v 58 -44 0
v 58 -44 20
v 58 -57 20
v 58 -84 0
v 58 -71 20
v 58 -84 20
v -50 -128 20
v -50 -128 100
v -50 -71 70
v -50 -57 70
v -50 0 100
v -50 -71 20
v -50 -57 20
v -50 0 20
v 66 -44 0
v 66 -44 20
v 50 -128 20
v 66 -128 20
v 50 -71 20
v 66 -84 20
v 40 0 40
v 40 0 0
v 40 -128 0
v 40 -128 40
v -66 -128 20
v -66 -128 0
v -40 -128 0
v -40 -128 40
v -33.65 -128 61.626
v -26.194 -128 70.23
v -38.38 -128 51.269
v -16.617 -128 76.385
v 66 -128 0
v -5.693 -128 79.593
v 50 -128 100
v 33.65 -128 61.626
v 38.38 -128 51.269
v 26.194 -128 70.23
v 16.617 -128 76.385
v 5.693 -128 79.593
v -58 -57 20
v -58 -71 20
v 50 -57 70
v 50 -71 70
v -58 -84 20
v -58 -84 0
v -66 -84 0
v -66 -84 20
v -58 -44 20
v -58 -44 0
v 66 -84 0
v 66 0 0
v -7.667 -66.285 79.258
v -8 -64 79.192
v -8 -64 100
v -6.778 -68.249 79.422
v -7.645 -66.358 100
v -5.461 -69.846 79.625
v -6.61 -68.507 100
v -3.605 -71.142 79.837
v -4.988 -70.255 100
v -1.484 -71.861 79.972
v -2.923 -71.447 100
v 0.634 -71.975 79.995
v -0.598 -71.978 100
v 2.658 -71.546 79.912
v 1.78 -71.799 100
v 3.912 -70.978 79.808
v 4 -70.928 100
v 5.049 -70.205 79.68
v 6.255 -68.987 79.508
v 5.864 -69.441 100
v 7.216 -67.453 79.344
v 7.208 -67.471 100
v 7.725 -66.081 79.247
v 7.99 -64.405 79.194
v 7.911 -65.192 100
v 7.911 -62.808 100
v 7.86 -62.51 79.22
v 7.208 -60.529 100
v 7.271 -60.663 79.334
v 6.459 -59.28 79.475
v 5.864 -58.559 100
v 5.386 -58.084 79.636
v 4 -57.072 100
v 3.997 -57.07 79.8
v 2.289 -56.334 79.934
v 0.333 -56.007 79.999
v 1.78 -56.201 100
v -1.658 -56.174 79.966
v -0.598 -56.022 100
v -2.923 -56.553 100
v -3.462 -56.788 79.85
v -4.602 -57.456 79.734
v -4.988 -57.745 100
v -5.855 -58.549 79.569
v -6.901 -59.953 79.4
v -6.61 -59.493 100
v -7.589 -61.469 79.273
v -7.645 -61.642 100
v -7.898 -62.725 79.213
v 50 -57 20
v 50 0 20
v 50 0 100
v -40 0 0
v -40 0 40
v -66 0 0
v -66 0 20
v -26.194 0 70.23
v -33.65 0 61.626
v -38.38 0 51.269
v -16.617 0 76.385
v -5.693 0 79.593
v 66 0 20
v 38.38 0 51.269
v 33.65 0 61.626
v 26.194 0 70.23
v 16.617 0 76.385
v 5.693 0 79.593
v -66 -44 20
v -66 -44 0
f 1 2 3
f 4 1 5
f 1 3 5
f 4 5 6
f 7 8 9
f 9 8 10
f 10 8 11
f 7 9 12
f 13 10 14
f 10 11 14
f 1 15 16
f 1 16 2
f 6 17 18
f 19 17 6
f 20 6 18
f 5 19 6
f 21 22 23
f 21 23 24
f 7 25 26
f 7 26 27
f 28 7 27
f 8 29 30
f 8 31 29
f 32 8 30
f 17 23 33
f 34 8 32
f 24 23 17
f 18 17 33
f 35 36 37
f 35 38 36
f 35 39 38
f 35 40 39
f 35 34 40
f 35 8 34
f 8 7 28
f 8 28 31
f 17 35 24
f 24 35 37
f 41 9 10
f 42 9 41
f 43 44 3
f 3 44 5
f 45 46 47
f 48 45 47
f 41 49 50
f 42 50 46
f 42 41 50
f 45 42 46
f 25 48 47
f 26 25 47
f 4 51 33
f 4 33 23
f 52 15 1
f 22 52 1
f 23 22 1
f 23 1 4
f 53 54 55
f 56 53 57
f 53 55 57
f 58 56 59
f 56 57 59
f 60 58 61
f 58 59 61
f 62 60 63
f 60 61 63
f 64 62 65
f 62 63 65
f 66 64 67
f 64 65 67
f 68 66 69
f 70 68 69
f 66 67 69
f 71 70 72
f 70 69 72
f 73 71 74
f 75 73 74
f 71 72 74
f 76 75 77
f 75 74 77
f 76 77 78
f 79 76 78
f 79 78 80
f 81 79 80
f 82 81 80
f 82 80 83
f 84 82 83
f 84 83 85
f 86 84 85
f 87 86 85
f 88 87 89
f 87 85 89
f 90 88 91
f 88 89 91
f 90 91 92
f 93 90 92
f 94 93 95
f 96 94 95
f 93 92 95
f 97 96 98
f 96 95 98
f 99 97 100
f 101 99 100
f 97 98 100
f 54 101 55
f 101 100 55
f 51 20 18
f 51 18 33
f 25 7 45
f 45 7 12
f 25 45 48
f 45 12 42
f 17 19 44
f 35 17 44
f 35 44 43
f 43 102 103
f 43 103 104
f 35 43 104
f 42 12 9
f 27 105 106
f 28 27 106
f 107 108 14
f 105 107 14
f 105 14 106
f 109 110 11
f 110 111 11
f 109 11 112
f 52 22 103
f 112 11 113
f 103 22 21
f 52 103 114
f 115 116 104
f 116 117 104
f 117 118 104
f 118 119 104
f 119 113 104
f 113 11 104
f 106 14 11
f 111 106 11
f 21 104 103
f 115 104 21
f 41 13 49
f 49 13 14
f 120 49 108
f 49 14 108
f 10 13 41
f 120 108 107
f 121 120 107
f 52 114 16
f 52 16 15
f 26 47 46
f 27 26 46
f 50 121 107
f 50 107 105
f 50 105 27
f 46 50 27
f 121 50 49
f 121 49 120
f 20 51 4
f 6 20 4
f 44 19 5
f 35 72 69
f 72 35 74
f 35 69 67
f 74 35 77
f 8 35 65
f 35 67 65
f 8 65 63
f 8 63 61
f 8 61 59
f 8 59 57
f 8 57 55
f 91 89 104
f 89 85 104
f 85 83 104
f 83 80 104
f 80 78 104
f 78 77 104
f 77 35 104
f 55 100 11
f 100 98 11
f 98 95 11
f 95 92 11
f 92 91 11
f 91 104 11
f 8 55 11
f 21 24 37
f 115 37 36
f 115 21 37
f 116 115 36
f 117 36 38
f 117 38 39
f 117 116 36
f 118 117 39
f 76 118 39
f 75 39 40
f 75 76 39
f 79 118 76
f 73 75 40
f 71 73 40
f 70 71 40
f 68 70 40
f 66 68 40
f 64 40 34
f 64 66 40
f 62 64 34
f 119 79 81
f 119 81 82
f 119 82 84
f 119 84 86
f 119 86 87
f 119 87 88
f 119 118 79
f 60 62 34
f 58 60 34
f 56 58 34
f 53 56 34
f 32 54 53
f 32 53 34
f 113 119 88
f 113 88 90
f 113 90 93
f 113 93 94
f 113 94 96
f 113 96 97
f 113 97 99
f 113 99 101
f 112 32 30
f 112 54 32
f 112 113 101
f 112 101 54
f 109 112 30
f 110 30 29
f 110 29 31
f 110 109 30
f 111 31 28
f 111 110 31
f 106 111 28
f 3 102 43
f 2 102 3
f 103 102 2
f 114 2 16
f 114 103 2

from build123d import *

# Parameters (mm, degrees)
PAD_DEPTH       = 128
SKETCH001_W     = 8
SKETCH001_H     = 40
POCKET_DEPTH    = 20.001
SKETCH002_W     = 50
SKETCH002_H     = 14
PAD001_DEPTH    = 8
SKETCH003_R     = 8
POCKET001_DEPTH = 100.001
POCKET002_DEPTH = 71.001


with BuildPart() as part:
    # Sketch → Pad (new body)
    with BuildSketch(Plane.XZ):
        with BuildLine():
            Line((-50, 100), (-50, 20))
            Line((-50, 20), (-66, 20))
            Line((-66, 20), (-66, 0))
            Line((-66, 0), (-40, 0))
            Line((-40, 0), (-40, 40))
            ThreePointArc((40, 40), (0, 80), (-40, 40))
            Line((40, 0), (40, 40))
            Line((66, 0), (40, 0))
            Line((66, 20), (66, 0))
            Line((50, 20), (66, 20))
            Line((50, 20), (50, 100))
            Line((50, 100), (-50, 100))
        make_face()
    extrude(amount=PAD_DEPTH)

    # Sketch001 (on Face12 of Pad) → Pocket (cut, through all)
    with BuildSketch(Plane(origin=(0, 0, 20), x_dir=(-1, 0, 0), z_dir=(0, 0, 1))):
        with Locations((-62, 64)):
            Rectangle(SKETCH001_W, SKETCH001_H)
        with Locations((62, 64)):
            Rectangle(SKETCH001_W, SKETCH001_H)
    extrude(amount=-POCKET_DEPTH, mode=Mode.SUBTRACT)

    # Sketch002 (on Face1 of Pocket) → Pad001 (join)
    with BuildSketch(Plane(origin=(50, 0, 0), x_dir=(0, 0, 1), z_dir=(1, 0, 0))):
        with Locations((45, 64)):
            Rectangle(SKETCH002_W, SKETCH002_H)
    extrude(amount=PAD001_DEPTH)

    # Sketch003 (on Face3 of Pad001) → Pocket001 (cut, through all)
    with BuildSketch(Plane(origin=(0, 0, 100), x_dir=(-1, 0, 0), z_dir=(0, 0, 1))):
        with Locations((0, 64)):
            Circle(SKETCH003_R)
    extrude(amount=-POCKET001_DEPTH, mode=Mode.SUBTRACT)

    # Sketch004 (on Face6 of Pocket001) → Pocket002 (cut, through all)
    with BuildSketch(Plane.XZ.offset(71)):
        Polygon((58, 20), (58, 70), (50, 70), align=None)
    extrude(amount=-POCKET002_DEPTH, mode=Mode.SUBTRACT)

    # Mirrored: part across YZ


with BuildPart() as part_1:
    add(part.part)
    add(part.part.mirror(Plane.YZ))


solid = part_1.part
